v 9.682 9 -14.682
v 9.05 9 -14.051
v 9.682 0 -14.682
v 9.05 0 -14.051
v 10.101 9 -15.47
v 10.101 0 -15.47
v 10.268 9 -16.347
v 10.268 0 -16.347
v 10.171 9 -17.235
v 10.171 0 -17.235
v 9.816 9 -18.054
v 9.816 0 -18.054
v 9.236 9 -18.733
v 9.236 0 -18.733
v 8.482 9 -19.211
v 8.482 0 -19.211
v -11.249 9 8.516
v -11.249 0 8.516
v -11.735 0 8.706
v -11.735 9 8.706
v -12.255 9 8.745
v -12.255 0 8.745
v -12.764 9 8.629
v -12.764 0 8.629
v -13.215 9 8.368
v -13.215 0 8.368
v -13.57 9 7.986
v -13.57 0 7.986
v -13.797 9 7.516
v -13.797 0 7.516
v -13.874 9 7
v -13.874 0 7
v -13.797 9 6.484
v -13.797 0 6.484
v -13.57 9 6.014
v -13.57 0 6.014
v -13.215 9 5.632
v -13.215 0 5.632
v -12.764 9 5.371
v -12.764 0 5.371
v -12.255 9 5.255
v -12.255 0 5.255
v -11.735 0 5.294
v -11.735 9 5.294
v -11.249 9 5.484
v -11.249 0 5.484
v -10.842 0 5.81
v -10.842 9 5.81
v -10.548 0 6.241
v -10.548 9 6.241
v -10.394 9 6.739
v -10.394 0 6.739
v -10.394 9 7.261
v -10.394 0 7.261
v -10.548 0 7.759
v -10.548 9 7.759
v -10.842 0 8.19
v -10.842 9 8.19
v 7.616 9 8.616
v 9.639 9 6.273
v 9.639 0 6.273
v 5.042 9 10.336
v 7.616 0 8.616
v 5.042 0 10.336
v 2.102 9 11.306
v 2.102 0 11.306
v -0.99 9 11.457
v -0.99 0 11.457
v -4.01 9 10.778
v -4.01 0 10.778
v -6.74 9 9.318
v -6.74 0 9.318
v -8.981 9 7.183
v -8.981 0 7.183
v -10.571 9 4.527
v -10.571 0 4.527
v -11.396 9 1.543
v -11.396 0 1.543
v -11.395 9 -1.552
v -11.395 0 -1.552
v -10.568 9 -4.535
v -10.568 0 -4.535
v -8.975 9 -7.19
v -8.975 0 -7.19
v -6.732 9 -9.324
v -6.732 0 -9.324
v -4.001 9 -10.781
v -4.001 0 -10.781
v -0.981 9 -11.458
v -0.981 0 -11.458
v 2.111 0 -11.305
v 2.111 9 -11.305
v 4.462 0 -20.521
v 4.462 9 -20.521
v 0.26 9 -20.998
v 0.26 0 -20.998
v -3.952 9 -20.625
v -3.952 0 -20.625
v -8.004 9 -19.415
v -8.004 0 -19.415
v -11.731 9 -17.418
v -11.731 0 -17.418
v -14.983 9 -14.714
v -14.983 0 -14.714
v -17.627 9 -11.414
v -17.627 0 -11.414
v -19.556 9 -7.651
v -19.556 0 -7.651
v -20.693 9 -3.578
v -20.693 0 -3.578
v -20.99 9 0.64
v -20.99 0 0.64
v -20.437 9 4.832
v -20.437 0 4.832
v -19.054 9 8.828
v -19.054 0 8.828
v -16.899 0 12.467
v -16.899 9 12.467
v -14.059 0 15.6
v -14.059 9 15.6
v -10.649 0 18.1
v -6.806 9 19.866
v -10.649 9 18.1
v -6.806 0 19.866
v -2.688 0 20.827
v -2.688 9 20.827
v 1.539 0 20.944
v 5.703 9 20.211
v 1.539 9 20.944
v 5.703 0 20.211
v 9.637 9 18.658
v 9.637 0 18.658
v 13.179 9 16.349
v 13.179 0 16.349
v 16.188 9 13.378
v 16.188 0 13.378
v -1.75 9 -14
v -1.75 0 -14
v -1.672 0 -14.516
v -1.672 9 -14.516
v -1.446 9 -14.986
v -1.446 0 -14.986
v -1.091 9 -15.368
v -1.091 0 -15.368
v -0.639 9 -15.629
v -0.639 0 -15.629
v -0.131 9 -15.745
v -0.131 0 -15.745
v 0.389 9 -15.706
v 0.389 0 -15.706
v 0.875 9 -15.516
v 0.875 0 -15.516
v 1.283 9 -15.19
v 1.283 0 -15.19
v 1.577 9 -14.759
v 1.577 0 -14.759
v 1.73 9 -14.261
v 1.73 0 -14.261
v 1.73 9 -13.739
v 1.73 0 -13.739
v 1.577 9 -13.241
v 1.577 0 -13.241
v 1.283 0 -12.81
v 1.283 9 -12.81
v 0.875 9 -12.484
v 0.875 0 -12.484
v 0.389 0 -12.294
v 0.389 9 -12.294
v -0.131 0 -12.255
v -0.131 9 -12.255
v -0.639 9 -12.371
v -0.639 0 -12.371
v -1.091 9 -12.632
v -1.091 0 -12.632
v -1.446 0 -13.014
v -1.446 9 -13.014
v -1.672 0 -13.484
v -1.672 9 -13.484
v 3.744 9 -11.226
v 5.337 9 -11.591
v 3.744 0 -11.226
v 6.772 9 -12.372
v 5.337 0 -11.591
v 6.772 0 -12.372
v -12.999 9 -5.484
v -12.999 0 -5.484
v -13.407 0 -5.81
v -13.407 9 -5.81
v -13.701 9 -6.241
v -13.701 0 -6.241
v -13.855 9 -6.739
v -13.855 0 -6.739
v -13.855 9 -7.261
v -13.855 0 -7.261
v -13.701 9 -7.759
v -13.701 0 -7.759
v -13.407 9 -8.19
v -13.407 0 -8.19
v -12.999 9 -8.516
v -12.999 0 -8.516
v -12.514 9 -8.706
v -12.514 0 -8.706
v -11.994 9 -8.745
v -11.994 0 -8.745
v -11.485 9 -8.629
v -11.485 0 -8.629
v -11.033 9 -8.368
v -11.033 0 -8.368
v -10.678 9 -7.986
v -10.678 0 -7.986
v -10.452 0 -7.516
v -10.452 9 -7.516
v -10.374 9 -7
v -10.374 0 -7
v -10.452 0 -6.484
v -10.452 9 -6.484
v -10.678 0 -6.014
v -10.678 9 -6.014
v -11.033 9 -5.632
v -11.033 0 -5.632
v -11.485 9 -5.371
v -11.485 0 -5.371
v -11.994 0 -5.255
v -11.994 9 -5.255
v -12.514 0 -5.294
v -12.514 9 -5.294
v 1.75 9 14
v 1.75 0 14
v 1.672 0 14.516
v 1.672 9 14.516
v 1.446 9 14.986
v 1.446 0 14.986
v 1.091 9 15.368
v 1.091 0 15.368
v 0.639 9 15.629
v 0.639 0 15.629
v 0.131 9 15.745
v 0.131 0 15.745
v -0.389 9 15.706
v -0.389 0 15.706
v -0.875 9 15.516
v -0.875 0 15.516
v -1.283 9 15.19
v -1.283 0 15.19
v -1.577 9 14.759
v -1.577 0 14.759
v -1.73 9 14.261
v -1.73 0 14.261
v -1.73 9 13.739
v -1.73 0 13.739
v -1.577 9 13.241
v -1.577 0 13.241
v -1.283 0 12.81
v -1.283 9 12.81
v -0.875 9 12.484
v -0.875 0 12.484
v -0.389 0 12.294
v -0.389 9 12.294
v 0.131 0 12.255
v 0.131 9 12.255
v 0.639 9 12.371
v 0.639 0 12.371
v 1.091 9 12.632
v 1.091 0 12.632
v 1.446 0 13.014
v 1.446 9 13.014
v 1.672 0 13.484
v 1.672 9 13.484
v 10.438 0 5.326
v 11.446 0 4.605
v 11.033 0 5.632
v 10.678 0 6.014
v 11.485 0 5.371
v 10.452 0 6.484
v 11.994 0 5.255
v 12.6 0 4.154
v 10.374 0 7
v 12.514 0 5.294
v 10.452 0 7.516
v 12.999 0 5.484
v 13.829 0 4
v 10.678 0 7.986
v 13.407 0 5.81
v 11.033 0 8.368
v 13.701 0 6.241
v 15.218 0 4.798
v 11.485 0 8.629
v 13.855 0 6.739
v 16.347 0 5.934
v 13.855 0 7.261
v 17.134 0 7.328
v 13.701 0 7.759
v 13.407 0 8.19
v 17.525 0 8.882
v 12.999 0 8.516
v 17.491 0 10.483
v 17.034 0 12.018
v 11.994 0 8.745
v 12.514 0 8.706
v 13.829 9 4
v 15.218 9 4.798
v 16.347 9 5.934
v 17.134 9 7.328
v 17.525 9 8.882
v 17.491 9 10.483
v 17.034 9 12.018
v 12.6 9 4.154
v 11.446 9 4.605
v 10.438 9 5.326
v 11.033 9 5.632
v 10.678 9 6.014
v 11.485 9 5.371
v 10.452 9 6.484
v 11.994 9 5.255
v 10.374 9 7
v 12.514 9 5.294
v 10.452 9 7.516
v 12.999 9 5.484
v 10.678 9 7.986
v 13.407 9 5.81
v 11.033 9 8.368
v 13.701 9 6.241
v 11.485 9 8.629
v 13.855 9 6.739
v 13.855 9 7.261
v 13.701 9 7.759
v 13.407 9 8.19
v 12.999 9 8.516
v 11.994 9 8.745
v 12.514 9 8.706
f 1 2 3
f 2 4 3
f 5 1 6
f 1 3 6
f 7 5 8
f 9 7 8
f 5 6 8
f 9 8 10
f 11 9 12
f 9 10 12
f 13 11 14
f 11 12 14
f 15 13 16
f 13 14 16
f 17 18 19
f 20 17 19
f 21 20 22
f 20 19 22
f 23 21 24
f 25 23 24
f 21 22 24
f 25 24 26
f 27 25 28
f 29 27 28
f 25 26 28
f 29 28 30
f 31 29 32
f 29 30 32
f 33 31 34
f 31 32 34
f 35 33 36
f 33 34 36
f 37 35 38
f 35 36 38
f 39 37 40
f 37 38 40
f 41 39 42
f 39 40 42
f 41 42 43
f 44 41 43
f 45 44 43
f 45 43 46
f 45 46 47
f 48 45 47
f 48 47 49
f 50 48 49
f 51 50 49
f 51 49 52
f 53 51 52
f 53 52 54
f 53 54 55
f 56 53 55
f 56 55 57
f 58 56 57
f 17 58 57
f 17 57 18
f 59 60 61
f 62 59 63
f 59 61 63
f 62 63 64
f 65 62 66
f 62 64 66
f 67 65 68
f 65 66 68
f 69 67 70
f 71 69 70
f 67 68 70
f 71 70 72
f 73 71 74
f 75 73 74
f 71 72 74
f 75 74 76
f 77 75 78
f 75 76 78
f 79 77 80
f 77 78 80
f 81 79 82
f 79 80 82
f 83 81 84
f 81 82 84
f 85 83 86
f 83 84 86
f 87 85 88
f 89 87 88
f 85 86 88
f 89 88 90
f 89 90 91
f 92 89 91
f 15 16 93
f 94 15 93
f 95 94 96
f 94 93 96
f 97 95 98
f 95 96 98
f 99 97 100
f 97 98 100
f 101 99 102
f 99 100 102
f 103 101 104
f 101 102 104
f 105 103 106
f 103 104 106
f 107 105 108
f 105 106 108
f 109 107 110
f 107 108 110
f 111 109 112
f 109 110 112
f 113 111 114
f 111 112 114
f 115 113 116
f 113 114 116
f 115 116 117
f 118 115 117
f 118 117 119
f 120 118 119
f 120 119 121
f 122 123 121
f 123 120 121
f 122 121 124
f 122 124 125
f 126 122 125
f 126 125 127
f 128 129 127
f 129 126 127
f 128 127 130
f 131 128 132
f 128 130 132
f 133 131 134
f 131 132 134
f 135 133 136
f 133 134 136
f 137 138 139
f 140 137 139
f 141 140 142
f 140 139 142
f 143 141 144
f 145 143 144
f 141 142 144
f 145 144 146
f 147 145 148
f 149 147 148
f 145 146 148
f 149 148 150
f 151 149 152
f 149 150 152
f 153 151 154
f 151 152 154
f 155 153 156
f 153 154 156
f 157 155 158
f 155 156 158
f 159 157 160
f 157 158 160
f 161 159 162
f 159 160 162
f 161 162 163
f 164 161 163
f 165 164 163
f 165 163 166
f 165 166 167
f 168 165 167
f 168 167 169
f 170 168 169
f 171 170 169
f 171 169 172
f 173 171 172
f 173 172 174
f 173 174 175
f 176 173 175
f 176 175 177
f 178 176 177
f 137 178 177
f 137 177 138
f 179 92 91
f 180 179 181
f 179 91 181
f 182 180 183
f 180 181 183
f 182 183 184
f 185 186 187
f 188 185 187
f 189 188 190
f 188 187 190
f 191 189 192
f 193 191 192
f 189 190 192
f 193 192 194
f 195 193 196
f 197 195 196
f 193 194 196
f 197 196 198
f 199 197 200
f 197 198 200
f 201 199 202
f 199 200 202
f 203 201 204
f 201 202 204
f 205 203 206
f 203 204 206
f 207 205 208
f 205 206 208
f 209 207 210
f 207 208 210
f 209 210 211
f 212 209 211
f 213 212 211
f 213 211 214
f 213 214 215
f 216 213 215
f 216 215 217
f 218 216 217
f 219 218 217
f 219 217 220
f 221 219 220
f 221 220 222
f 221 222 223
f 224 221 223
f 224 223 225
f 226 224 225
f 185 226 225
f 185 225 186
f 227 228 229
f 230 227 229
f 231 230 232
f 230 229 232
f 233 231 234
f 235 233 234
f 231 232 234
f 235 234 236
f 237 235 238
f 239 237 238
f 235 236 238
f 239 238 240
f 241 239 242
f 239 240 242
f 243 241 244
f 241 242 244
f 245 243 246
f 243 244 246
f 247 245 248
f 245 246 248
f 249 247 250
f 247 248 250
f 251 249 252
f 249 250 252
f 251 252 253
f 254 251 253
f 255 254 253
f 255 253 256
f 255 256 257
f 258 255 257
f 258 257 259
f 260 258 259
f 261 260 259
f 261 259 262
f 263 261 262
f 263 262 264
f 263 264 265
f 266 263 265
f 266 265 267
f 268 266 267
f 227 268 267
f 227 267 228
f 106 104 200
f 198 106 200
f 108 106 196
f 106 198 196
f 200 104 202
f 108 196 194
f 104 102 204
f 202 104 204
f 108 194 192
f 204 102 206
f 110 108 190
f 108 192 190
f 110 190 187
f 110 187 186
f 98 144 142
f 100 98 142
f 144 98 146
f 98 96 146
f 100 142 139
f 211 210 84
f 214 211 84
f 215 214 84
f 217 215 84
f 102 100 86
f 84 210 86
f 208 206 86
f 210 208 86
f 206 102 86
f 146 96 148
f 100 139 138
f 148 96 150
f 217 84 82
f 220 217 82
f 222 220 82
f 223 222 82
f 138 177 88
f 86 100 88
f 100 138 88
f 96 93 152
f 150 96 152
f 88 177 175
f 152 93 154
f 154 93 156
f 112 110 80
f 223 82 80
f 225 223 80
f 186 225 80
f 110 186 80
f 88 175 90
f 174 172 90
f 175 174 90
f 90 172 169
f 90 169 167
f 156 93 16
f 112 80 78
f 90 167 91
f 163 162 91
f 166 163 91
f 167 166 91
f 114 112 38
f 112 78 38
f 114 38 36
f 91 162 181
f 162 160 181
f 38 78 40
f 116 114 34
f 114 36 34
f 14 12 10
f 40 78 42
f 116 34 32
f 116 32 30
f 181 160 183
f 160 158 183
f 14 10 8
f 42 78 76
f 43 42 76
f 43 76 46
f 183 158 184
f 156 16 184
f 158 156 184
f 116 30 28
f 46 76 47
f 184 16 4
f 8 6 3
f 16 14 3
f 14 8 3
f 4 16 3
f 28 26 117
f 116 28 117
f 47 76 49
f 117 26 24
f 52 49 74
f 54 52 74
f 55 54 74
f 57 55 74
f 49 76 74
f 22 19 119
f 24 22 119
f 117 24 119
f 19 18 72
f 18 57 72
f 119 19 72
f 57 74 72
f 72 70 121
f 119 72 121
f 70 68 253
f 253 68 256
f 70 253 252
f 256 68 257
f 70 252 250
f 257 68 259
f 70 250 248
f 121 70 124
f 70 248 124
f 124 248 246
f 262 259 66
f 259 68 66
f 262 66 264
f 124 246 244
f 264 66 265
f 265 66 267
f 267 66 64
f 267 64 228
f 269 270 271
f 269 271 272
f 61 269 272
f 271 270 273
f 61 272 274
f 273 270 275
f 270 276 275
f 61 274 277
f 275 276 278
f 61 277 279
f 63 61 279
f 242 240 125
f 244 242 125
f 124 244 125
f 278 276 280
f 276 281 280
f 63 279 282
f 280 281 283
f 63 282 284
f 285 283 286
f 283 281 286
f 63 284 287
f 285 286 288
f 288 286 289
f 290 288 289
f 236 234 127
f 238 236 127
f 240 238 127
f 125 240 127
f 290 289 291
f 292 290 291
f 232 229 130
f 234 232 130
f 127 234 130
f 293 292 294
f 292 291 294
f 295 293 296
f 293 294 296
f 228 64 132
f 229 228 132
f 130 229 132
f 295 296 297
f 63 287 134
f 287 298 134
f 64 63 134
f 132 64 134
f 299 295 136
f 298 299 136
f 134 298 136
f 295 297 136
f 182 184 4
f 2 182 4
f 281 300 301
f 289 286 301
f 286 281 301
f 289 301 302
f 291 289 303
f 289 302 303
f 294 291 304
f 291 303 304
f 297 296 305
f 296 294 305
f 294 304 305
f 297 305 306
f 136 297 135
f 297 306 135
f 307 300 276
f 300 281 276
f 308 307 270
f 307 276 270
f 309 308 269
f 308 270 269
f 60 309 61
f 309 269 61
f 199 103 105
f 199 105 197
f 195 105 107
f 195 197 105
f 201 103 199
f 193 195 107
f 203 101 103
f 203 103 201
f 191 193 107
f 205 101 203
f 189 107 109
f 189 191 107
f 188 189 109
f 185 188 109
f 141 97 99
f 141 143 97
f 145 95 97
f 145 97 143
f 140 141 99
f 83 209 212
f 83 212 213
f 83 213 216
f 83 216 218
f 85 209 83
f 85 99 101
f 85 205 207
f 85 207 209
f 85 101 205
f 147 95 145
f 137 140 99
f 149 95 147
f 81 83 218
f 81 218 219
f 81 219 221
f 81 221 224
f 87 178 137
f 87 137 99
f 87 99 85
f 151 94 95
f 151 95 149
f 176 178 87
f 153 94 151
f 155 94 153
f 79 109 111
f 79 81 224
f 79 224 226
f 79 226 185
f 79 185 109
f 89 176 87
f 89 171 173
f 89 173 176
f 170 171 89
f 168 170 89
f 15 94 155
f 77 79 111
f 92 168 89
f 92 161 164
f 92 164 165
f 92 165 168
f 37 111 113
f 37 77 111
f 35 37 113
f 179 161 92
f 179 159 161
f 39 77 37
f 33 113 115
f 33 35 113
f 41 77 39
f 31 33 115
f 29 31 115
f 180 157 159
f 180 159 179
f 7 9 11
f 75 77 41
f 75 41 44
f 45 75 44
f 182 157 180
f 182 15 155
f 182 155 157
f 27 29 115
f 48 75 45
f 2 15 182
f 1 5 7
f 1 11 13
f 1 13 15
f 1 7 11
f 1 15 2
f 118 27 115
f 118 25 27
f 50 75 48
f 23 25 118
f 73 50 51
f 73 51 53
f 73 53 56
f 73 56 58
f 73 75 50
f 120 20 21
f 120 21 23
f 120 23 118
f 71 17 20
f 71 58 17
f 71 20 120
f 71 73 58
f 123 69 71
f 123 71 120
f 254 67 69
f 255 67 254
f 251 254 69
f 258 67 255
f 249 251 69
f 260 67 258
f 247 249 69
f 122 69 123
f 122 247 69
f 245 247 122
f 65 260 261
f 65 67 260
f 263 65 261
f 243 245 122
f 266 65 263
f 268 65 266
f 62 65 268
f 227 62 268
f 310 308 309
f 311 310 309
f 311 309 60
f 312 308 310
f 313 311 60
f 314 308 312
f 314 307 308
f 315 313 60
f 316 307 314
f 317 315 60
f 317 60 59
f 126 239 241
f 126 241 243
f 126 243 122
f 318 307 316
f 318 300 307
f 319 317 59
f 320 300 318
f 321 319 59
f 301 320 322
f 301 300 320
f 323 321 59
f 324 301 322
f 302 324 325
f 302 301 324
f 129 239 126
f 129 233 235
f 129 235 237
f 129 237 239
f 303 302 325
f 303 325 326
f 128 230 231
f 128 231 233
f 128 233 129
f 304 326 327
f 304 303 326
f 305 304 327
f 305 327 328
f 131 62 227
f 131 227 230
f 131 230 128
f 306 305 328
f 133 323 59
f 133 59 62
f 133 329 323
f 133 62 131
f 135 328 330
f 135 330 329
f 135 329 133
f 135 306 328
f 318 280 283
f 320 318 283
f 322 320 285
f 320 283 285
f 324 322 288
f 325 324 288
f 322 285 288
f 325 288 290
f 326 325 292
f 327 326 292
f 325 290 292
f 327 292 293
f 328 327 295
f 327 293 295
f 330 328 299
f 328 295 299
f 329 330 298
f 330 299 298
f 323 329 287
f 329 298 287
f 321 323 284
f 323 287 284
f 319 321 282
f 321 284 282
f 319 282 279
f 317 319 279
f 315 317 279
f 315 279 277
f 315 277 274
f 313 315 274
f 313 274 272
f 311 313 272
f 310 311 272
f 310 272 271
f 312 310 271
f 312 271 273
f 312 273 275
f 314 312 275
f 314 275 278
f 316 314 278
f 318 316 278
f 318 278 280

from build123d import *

# Parameters (mm, degrees)
SKETCH_1_R               = 21
EXTRUDE_1_DEPTH          = 9
HOLE_WIZARD_1_D          = 3.5
PATTERN_CIRCULAR_1_COUNT = 6
HOLE_WIZARD_2_D          = 23
SKETCH_7_W               = 20
SKETCH_7_H               = 8
CUT_EXTRUDE_1_DEPTH      = 10
FILLET_1_R               = 5
FILLET_2_R               = 6
CUT_EXTRUDE_2_DEPTH      = 10
FILLET_3_R               = 6
FILLET_4_R               = 3


with BuildPart() as part:
    # 草图1 → 凸台-拉伸1 (new body)
    with BuildSketch(Plane(origin=(0, 0, 0), x_dir=(1, 0, 0), z_dir=(0, 1, 0))):
        with Locations(Location((0, 0, 0), (0, 0, 270))):
            Circle(SKETCH_1_R)
    extrude(amount=EXTRUDE_1_DEPTH)

    # 孔1 (through all)
    with Locations(Plane(origin=(0, 9, 0), x_dir=(1, 0, 0), z_dir=(0, 1, 0))):
        with Locations((0, 14)):
            hole_wizard_1 = Hole(HOLE_WIZARD_1_D / 2)

    # 阵列(圆周)1: 孔1 ×6 about axis
    pattern_circular_1_axis = Axis((0, 0, 0), (0, 1, 0))
    for i in range(1, PATTERN_CIRCULAR_1_COUNT):
        add(hole_wizard_1.rotate(pattern_circular_1_axis, i * 360 / PATTERN_CIRCULAR_1_COUNT), mode=Mode.SUBTRACT)

    # 孔2 (through all)
    with Locations(Plane(origin=(0, 9, 0), x_dir=(1, 0, 0), z_dir=(0, 1, 0))):
        with Locations((0, 0)):
            Hole(HOLE_WIZARD_2_D / 2)

    # 草图7 → 切除-拉伸1 (cut)
    with BuildSketch(Plane.XZ):
        with Locations((14, 0)):
            Rectangle(SKETCH_7_W, SKETCH_7_H)
    extrude(amount=-CUT_EXTRUDE_1_DEPTH, mode=Mode.SUBTRACT)

    # 圆角1
    fillet_1_edges = [part.edges().sort_by_distance(p)[0] for p in [
        (10.781929326, 4.5, -4),
        (10.781929326, 4.5, 4),
    ]]
    fillet(fillet_1_edges, radius=FILLET_1_R)

    # 圆角2
    # the kernel refuses this fillet: 6 mm, written as the material it takes off along each edge
    with BuildSketch(Plane(origin=(20.615528128, 34.925810939, 4), x_dir=(-1, 0, 0), z_dir=(0, -1, 0))) as fillet_2_piece_1:
        with BuildLine():
            CenterArc((9.052881986, -5.555376193), FILLET_2_R, 112.196140843, 107.374202327)
            Line((4.427823529, -9.37752667), (4.33532236, -9.45396968))
            ThreePointArc((4.33532236, -9.45396968), (1.517440537, -5.017618885), (-0.117803018, -0.022857143))
            Line((-0.117803018, -0.022857143), (0, 0.12))
            ThreePointArc((0, 0.12), (3.393105721, 0.12), (6.740878031, 0.111107524))
            Line((6.740878031, 0.111107524), (6.786211442, 0))
        make_face()
    extrude(amount=60.851621878, mode=Mode.SUBTRACT)
    with BuildSketch(Plane(origin=(20.615528128, 34.925810939, -4), x_dir=(-0.42697059114477015, 0, -0.9042655109521127), z_dir=(0, -1, 0))) as fillet_2_piece_2:
        with BuildLine():
            CenterArc((8.888849465, -5.814226697), FILLET_2_R, 75.705116129, 107.374202327)
            Line((2.897512711, -6.136536957), (2.777685976, -6.142983162))
            ThreePointArc((2.777685976, -6.142983162), (1.340244494, -3.11950495), (-0.108511861, -0.051236471))
            Line((-0.108511861, -0.051236471), (-0.029629498, 0.116284534))
            ThreePointArc((-0.029629498, 0.116284534), (5.185162188, 0.770206559), (10.399953874, 0.116284534))
            Line((10.399953874, 0.116284534), (10.370324376, 0))
        make_face()
    extrude(amount=60.851621878, mode=Mode.SUBTRACT)

    # 草图8 → 切除-拉伸2 (cut)
    with BuildSketch(Plane(origin=(0, 0, 0), x_dir=(-1, 0, 0), z_dir=(0, -1, 0))):
        Polygon((1.25741602, 6.455059929), (-16.607431005, 19.620253888), (-25.506127326, 7.544940071), (-7.641280301, -5.620253888), align=None)
    extrude(amount=-CUT_EXTRUDE_2_DEPTH, mode=Mode.SUBTRACT)

    # 圆角3
    fillet_3_edges = [part.edges().sort_by_distance(p)[0] for p in [
        (4.400672865, 4.5, -10.624691917),
    ]]
    fillet(fillet_3_edges, radius=FILLET_3_R)

    # 圆角4
    fillet_4_edges = [part.edges().sort_by_distance(p)[0] for p in [
        (12.68916526, 4.5, -16.732754854),
    ]]
    fillet(fillet_4_edges, radius=FILLET_4_R)


solid = part.part
